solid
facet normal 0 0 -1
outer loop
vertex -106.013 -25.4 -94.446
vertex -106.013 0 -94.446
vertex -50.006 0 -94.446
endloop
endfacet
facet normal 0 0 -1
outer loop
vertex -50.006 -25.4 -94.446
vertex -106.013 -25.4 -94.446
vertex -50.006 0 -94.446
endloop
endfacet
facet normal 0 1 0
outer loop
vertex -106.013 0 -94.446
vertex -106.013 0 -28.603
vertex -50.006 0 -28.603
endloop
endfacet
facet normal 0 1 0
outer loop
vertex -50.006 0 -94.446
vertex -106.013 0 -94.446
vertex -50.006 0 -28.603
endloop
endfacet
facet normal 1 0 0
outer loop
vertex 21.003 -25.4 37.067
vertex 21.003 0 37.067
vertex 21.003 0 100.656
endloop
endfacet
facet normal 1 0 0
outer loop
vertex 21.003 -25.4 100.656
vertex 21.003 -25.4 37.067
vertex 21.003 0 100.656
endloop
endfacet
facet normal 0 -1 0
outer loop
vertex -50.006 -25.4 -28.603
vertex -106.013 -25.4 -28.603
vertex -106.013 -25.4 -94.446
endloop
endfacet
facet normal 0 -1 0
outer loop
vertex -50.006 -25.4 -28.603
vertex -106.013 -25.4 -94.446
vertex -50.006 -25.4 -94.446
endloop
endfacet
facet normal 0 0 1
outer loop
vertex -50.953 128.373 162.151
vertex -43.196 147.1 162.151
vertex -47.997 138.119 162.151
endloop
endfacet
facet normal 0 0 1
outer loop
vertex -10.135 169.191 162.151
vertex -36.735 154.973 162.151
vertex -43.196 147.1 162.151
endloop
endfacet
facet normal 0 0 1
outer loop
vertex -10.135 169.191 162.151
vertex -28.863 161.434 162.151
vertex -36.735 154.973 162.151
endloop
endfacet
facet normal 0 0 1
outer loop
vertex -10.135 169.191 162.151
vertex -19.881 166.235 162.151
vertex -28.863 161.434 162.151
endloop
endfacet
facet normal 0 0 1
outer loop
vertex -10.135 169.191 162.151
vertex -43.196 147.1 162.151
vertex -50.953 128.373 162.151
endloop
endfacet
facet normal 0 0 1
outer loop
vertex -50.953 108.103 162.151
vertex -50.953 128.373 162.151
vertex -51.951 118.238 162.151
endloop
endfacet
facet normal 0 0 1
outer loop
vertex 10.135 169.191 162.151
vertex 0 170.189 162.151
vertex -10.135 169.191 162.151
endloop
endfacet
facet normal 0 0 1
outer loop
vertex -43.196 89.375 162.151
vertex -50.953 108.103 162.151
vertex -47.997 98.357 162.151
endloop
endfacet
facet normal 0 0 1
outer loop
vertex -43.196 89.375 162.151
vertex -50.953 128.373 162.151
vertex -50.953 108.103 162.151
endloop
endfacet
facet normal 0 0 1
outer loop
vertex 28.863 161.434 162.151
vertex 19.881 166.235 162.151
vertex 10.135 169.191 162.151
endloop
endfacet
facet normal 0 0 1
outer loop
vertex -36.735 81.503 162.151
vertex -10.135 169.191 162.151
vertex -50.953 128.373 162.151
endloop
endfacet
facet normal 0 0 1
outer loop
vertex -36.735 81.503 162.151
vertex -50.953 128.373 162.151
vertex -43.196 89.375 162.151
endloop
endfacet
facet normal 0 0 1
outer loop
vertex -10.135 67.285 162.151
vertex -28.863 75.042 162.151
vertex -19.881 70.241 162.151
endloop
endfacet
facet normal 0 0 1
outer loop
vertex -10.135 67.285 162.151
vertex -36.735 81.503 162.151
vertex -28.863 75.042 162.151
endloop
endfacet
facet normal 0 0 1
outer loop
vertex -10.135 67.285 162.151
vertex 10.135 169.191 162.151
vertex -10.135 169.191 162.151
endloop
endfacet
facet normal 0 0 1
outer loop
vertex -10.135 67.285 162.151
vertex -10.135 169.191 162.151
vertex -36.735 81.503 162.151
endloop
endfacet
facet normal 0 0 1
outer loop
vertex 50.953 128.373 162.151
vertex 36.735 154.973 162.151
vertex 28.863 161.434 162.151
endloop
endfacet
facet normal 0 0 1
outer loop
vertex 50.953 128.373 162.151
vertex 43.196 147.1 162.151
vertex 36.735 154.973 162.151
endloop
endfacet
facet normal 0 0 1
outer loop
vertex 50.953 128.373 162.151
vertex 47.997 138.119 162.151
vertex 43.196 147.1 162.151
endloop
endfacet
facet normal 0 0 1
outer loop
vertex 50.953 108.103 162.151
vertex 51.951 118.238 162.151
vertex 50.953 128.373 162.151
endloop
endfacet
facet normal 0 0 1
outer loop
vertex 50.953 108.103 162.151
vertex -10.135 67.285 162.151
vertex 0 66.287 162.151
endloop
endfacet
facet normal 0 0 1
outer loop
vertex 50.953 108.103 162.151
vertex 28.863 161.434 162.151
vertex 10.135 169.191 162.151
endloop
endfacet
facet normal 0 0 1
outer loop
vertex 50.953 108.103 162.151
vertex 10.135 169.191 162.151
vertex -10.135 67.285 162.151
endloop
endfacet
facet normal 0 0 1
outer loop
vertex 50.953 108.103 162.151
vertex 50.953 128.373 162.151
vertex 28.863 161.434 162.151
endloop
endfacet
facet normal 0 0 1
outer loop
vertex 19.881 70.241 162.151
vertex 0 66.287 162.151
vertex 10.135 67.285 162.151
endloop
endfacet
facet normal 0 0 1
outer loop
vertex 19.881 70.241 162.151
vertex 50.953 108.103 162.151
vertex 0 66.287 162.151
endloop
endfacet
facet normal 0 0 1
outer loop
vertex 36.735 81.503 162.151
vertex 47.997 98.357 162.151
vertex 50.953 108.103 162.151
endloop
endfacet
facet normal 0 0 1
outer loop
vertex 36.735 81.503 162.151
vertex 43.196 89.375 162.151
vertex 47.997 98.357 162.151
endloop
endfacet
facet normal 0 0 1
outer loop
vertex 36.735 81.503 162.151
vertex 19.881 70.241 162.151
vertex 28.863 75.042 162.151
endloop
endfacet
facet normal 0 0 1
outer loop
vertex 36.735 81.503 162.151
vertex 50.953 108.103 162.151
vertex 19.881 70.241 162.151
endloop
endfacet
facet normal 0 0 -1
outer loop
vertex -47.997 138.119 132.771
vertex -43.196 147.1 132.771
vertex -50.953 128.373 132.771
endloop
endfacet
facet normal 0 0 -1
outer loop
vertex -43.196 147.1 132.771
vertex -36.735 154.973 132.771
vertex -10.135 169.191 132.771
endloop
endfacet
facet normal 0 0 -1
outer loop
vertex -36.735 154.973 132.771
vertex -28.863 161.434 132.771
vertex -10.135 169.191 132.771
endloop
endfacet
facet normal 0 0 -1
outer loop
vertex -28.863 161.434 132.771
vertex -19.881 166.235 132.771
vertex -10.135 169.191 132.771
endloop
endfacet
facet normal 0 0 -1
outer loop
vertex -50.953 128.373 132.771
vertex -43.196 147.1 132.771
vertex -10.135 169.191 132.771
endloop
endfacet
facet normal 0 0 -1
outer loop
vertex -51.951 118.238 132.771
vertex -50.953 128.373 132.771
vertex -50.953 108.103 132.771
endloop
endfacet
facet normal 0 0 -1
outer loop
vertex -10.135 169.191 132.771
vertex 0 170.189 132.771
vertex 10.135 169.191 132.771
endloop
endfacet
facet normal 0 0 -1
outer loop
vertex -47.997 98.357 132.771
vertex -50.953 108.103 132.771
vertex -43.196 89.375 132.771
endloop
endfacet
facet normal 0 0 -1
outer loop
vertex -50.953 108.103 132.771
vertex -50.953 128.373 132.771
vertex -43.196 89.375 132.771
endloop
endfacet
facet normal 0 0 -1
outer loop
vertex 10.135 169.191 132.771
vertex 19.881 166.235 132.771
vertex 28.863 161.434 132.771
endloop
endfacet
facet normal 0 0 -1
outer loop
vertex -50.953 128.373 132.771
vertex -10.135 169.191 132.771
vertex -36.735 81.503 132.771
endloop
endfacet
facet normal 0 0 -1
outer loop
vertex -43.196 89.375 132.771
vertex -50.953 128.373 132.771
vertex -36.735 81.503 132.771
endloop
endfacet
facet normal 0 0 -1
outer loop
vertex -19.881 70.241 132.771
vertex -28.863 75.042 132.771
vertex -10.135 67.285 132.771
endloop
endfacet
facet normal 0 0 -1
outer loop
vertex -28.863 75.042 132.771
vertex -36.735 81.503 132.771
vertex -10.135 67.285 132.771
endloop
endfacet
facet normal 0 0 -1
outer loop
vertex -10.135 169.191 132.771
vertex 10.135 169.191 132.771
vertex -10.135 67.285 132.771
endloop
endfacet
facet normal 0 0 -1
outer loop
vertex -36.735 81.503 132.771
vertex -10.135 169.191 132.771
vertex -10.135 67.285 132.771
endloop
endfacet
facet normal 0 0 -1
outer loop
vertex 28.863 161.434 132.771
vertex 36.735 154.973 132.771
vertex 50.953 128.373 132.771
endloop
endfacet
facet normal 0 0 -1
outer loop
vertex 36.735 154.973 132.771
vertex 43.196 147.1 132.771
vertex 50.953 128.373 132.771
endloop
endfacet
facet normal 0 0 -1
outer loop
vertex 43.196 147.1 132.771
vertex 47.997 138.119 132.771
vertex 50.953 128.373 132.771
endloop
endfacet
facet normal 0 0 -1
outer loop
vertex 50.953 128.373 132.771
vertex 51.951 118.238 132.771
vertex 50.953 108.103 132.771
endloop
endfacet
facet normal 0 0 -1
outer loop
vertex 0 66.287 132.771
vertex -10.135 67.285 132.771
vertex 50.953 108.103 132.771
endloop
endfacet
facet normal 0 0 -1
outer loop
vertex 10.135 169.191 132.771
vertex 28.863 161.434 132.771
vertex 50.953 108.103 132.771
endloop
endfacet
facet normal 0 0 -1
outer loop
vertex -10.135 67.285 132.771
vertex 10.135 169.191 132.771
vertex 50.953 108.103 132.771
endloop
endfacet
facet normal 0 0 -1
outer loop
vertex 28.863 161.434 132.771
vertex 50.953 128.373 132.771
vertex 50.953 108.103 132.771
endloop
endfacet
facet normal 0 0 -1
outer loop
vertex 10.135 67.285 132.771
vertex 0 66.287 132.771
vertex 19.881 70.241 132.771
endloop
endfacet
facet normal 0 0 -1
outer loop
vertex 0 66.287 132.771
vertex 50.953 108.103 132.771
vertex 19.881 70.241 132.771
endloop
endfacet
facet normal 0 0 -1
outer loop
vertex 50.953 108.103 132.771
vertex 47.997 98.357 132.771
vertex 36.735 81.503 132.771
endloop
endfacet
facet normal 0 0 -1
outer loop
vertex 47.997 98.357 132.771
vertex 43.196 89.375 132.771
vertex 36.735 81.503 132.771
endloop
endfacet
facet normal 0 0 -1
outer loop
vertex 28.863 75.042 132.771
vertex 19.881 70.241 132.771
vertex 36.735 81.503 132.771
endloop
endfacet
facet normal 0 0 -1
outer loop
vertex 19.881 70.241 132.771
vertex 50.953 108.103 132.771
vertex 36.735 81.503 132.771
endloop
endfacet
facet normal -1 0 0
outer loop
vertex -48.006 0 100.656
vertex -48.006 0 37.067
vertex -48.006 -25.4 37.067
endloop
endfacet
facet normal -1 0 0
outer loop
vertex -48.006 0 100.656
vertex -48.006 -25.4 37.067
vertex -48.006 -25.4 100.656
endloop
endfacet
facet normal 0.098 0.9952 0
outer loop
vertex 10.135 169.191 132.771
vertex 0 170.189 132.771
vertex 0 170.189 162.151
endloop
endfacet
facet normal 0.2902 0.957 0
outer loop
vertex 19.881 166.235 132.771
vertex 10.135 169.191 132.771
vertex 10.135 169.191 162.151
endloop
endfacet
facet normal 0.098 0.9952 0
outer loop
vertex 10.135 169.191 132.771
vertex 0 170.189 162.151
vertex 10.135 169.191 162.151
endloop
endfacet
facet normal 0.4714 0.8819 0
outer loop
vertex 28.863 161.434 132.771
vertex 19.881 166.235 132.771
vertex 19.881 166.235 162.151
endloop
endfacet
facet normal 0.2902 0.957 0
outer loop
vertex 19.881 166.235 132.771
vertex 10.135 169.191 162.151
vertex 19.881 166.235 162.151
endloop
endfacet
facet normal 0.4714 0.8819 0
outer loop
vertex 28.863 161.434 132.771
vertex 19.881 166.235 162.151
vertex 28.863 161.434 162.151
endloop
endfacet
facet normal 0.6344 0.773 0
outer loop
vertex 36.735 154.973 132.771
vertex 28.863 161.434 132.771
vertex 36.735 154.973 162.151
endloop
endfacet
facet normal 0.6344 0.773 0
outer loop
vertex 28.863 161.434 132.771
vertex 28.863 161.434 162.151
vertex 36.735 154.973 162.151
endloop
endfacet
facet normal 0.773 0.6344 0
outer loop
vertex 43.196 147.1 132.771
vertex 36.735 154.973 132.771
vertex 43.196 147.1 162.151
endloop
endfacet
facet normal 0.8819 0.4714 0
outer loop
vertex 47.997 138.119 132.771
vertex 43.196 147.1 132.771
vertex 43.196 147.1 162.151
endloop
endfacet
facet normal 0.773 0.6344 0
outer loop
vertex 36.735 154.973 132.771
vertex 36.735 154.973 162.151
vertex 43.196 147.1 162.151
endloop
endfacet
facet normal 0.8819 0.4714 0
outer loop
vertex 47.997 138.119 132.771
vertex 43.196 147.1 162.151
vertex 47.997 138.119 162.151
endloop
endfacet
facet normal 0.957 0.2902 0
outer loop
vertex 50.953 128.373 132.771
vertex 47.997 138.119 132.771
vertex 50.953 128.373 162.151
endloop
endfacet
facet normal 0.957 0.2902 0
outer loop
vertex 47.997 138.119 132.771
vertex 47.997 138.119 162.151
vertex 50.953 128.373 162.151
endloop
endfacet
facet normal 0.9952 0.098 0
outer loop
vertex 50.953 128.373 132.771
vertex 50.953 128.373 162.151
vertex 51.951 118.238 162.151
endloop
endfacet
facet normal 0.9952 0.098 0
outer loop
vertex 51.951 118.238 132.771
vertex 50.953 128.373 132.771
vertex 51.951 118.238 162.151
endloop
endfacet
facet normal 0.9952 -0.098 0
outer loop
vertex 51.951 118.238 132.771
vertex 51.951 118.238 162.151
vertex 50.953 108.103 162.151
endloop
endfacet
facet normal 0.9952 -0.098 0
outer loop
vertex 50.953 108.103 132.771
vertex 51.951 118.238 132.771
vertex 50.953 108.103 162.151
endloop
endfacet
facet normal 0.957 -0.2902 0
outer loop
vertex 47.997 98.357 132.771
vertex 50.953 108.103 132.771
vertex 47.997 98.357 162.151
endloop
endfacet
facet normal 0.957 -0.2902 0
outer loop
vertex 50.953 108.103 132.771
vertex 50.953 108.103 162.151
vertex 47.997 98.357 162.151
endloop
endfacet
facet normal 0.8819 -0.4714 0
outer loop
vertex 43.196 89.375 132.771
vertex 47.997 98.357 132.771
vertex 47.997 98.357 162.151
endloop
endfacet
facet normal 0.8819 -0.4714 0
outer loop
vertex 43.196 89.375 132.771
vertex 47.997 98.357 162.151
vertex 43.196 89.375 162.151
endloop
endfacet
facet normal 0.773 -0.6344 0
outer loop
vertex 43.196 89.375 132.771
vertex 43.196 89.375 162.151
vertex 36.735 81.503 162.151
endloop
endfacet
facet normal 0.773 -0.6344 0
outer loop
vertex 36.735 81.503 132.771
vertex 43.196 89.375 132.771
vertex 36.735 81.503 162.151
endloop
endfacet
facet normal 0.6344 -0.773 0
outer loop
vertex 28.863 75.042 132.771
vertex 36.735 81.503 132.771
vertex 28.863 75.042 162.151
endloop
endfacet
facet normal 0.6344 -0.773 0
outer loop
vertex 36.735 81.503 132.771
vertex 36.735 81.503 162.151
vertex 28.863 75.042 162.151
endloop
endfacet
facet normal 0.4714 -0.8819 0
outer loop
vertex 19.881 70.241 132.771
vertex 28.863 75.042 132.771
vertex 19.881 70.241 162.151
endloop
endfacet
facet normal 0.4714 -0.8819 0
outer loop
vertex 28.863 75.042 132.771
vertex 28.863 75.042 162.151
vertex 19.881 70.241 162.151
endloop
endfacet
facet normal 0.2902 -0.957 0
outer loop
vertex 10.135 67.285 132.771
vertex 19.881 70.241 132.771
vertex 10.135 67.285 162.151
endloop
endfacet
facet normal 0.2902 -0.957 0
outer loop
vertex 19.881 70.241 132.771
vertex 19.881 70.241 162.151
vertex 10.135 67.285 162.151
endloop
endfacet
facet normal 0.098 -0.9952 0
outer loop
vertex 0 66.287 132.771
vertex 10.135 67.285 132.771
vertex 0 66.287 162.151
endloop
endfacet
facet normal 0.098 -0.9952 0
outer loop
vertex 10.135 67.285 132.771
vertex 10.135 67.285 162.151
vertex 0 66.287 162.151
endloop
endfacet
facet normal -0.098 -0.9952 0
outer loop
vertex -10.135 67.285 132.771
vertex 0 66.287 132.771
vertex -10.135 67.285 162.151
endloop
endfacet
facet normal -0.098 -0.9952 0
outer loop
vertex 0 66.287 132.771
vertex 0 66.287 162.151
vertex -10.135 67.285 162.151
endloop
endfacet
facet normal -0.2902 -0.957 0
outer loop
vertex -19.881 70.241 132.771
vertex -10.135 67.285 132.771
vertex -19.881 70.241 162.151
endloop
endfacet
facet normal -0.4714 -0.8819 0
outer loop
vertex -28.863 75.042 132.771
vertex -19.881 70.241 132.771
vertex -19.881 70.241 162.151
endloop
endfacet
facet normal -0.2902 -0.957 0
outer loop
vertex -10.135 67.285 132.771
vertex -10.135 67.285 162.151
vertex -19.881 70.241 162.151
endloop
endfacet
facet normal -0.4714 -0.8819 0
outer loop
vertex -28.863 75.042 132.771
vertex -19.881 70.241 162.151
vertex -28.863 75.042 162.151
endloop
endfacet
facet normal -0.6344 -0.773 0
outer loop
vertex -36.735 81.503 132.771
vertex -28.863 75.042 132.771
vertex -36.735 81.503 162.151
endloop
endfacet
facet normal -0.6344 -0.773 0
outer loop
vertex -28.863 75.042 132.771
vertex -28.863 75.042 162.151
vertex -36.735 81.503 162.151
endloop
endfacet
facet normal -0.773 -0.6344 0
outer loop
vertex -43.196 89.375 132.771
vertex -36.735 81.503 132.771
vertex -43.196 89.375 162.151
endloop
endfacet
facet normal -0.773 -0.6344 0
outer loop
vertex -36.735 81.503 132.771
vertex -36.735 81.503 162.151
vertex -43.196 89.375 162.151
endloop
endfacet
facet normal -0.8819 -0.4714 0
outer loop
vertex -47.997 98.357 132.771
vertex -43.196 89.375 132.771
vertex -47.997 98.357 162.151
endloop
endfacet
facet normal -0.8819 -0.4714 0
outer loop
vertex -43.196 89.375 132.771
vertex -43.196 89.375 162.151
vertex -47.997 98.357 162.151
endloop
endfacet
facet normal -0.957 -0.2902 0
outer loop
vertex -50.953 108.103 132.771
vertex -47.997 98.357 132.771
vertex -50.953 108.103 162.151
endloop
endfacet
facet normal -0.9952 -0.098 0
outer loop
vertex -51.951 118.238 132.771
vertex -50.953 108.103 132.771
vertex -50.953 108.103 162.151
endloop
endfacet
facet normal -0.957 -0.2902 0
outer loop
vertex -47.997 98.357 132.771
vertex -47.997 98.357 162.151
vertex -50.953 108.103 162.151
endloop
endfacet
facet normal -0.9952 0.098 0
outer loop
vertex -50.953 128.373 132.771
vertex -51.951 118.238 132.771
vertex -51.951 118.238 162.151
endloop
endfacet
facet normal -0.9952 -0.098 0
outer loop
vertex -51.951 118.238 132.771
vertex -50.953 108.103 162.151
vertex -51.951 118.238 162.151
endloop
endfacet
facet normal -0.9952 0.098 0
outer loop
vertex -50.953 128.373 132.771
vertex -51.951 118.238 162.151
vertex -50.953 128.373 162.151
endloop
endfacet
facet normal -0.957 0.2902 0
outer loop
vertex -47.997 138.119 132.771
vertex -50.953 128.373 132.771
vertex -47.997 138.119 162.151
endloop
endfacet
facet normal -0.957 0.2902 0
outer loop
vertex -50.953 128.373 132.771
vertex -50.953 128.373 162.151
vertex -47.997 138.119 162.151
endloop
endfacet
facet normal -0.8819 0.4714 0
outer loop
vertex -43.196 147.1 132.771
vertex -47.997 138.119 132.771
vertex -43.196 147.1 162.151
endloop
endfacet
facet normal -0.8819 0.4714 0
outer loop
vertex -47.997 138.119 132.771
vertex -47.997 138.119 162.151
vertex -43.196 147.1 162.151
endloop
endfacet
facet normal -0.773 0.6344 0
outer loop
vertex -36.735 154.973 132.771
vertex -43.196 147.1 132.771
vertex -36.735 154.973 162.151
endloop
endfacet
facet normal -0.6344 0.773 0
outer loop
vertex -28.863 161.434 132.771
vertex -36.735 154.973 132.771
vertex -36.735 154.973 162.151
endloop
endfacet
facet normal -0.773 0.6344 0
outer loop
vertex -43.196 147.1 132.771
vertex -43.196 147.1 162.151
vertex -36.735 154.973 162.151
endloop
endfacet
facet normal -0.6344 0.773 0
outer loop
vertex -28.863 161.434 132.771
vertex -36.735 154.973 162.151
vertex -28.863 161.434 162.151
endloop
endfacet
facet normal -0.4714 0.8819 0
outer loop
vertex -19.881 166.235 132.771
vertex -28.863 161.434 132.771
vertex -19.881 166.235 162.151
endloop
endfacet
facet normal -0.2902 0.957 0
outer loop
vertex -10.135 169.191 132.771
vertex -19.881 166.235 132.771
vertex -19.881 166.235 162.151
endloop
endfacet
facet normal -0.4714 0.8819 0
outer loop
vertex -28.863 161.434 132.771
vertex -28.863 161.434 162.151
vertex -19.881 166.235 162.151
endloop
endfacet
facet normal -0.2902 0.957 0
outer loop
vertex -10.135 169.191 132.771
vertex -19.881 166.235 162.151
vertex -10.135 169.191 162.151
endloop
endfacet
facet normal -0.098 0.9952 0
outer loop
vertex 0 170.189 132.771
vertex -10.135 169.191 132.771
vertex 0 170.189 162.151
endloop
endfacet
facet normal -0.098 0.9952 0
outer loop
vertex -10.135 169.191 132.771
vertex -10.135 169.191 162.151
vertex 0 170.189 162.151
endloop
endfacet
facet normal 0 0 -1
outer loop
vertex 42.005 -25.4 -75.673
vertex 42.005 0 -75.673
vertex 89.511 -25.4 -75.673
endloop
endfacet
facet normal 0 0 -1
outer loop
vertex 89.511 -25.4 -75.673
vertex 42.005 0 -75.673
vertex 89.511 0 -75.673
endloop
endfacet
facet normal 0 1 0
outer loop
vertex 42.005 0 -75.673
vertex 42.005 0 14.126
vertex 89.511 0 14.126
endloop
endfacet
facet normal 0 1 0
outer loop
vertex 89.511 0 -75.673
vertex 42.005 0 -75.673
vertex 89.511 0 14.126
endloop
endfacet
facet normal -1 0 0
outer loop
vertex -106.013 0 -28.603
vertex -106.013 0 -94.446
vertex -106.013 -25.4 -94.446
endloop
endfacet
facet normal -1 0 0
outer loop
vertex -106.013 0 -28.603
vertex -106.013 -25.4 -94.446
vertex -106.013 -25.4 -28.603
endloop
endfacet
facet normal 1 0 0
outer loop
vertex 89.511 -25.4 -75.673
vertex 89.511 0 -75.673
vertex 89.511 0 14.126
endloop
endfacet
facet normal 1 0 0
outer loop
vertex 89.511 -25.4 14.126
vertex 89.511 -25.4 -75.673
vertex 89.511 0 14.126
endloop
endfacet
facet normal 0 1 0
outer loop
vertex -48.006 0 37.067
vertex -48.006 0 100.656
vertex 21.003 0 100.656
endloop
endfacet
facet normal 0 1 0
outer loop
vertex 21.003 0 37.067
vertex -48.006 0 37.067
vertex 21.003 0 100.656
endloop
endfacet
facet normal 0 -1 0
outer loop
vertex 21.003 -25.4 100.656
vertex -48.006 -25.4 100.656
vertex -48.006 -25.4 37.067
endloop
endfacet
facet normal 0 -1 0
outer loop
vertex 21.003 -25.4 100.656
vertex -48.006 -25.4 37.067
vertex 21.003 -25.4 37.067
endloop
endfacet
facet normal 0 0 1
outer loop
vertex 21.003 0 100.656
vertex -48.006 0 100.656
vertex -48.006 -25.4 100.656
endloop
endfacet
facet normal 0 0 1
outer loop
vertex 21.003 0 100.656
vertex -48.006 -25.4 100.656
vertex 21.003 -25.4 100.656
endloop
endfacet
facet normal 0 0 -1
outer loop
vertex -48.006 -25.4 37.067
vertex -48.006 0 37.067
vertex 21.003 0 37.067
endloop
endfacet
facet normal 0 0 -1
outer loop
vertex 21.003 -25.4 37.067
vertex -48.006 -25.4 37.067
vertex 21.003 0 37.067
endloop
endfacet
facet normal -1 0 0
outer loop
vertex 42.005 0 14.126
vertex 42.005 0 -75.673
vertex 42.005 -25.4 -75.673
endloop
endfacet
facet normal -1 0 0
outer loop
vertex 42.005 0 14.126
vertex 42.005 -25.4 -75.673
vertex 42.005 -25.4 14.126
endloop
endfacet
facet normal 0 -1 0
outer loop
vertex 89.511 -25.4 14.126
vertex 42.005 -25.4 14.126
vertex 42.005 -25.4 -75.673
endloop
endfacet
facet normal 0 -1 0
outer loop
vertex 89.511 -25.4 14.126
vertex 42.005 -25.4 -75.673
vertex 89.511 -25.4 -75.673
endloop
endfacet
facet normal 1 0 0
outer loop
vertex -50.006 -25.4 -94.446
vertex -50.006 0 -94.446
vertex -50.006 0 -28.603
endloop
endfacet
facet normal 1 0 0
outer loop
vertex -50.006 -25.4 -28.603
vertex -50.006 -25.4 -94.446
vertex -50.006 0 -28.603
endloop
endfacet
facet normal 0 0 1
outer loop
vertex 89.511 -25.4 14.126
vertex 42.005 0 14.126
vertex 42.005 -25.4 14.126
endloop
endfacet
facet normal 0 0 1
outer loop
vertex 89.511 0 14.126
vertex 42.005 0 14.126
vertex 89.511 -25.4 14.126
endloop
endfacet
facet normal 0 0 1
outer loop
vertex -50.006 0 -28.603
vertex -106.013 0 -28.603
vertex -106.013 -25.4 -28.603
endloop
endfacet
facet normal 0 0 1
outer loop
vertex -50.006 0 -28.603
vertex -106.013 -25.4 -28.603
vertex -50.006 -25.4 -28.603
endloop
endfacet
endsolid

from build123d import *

# Parameters (mm, degrees)
F0_W     = 69.008611
F0_H     = 63.589357
F0_W_2   = 56.006998
F0_H_2   = 65.842398
F0_W_3   = 47.505938
F0_H_3   = 89.799113
F1_DEPTH = 25.4
F2_W     = 51.951184
F2_H     = 29.379919


with BuildPart() as f1:
    # F0 (on Front) → F1 (new body)
    with BuildSketch(Plane.XZ):
        with Locations((-13.501678, 68.861436)):
            Rectangle(F0_W, F0_H)
        with Locations((-78.009732, -61.52438)):
            Rectangle(F0_W_2, F0_H_2)
        with Locations((65.758232, -30.77348)):
            Rectangle(F0_W_3, F0_H_3)
    extrude(amount=F1_DEPTH)


with BuildPart() as f3:
    # F2 (on Right) → F3 (revolve)
    with BuildSketch(Plane.YZ):
        with Locations((144.21352, 147.461318)):
            Rectangle(F2_W, F2_H)
    revolve(axis=Axis((0, 118.237928, 147.461317), (0, 0, -1)))


solid = Compound([f1.part, f3.part])
